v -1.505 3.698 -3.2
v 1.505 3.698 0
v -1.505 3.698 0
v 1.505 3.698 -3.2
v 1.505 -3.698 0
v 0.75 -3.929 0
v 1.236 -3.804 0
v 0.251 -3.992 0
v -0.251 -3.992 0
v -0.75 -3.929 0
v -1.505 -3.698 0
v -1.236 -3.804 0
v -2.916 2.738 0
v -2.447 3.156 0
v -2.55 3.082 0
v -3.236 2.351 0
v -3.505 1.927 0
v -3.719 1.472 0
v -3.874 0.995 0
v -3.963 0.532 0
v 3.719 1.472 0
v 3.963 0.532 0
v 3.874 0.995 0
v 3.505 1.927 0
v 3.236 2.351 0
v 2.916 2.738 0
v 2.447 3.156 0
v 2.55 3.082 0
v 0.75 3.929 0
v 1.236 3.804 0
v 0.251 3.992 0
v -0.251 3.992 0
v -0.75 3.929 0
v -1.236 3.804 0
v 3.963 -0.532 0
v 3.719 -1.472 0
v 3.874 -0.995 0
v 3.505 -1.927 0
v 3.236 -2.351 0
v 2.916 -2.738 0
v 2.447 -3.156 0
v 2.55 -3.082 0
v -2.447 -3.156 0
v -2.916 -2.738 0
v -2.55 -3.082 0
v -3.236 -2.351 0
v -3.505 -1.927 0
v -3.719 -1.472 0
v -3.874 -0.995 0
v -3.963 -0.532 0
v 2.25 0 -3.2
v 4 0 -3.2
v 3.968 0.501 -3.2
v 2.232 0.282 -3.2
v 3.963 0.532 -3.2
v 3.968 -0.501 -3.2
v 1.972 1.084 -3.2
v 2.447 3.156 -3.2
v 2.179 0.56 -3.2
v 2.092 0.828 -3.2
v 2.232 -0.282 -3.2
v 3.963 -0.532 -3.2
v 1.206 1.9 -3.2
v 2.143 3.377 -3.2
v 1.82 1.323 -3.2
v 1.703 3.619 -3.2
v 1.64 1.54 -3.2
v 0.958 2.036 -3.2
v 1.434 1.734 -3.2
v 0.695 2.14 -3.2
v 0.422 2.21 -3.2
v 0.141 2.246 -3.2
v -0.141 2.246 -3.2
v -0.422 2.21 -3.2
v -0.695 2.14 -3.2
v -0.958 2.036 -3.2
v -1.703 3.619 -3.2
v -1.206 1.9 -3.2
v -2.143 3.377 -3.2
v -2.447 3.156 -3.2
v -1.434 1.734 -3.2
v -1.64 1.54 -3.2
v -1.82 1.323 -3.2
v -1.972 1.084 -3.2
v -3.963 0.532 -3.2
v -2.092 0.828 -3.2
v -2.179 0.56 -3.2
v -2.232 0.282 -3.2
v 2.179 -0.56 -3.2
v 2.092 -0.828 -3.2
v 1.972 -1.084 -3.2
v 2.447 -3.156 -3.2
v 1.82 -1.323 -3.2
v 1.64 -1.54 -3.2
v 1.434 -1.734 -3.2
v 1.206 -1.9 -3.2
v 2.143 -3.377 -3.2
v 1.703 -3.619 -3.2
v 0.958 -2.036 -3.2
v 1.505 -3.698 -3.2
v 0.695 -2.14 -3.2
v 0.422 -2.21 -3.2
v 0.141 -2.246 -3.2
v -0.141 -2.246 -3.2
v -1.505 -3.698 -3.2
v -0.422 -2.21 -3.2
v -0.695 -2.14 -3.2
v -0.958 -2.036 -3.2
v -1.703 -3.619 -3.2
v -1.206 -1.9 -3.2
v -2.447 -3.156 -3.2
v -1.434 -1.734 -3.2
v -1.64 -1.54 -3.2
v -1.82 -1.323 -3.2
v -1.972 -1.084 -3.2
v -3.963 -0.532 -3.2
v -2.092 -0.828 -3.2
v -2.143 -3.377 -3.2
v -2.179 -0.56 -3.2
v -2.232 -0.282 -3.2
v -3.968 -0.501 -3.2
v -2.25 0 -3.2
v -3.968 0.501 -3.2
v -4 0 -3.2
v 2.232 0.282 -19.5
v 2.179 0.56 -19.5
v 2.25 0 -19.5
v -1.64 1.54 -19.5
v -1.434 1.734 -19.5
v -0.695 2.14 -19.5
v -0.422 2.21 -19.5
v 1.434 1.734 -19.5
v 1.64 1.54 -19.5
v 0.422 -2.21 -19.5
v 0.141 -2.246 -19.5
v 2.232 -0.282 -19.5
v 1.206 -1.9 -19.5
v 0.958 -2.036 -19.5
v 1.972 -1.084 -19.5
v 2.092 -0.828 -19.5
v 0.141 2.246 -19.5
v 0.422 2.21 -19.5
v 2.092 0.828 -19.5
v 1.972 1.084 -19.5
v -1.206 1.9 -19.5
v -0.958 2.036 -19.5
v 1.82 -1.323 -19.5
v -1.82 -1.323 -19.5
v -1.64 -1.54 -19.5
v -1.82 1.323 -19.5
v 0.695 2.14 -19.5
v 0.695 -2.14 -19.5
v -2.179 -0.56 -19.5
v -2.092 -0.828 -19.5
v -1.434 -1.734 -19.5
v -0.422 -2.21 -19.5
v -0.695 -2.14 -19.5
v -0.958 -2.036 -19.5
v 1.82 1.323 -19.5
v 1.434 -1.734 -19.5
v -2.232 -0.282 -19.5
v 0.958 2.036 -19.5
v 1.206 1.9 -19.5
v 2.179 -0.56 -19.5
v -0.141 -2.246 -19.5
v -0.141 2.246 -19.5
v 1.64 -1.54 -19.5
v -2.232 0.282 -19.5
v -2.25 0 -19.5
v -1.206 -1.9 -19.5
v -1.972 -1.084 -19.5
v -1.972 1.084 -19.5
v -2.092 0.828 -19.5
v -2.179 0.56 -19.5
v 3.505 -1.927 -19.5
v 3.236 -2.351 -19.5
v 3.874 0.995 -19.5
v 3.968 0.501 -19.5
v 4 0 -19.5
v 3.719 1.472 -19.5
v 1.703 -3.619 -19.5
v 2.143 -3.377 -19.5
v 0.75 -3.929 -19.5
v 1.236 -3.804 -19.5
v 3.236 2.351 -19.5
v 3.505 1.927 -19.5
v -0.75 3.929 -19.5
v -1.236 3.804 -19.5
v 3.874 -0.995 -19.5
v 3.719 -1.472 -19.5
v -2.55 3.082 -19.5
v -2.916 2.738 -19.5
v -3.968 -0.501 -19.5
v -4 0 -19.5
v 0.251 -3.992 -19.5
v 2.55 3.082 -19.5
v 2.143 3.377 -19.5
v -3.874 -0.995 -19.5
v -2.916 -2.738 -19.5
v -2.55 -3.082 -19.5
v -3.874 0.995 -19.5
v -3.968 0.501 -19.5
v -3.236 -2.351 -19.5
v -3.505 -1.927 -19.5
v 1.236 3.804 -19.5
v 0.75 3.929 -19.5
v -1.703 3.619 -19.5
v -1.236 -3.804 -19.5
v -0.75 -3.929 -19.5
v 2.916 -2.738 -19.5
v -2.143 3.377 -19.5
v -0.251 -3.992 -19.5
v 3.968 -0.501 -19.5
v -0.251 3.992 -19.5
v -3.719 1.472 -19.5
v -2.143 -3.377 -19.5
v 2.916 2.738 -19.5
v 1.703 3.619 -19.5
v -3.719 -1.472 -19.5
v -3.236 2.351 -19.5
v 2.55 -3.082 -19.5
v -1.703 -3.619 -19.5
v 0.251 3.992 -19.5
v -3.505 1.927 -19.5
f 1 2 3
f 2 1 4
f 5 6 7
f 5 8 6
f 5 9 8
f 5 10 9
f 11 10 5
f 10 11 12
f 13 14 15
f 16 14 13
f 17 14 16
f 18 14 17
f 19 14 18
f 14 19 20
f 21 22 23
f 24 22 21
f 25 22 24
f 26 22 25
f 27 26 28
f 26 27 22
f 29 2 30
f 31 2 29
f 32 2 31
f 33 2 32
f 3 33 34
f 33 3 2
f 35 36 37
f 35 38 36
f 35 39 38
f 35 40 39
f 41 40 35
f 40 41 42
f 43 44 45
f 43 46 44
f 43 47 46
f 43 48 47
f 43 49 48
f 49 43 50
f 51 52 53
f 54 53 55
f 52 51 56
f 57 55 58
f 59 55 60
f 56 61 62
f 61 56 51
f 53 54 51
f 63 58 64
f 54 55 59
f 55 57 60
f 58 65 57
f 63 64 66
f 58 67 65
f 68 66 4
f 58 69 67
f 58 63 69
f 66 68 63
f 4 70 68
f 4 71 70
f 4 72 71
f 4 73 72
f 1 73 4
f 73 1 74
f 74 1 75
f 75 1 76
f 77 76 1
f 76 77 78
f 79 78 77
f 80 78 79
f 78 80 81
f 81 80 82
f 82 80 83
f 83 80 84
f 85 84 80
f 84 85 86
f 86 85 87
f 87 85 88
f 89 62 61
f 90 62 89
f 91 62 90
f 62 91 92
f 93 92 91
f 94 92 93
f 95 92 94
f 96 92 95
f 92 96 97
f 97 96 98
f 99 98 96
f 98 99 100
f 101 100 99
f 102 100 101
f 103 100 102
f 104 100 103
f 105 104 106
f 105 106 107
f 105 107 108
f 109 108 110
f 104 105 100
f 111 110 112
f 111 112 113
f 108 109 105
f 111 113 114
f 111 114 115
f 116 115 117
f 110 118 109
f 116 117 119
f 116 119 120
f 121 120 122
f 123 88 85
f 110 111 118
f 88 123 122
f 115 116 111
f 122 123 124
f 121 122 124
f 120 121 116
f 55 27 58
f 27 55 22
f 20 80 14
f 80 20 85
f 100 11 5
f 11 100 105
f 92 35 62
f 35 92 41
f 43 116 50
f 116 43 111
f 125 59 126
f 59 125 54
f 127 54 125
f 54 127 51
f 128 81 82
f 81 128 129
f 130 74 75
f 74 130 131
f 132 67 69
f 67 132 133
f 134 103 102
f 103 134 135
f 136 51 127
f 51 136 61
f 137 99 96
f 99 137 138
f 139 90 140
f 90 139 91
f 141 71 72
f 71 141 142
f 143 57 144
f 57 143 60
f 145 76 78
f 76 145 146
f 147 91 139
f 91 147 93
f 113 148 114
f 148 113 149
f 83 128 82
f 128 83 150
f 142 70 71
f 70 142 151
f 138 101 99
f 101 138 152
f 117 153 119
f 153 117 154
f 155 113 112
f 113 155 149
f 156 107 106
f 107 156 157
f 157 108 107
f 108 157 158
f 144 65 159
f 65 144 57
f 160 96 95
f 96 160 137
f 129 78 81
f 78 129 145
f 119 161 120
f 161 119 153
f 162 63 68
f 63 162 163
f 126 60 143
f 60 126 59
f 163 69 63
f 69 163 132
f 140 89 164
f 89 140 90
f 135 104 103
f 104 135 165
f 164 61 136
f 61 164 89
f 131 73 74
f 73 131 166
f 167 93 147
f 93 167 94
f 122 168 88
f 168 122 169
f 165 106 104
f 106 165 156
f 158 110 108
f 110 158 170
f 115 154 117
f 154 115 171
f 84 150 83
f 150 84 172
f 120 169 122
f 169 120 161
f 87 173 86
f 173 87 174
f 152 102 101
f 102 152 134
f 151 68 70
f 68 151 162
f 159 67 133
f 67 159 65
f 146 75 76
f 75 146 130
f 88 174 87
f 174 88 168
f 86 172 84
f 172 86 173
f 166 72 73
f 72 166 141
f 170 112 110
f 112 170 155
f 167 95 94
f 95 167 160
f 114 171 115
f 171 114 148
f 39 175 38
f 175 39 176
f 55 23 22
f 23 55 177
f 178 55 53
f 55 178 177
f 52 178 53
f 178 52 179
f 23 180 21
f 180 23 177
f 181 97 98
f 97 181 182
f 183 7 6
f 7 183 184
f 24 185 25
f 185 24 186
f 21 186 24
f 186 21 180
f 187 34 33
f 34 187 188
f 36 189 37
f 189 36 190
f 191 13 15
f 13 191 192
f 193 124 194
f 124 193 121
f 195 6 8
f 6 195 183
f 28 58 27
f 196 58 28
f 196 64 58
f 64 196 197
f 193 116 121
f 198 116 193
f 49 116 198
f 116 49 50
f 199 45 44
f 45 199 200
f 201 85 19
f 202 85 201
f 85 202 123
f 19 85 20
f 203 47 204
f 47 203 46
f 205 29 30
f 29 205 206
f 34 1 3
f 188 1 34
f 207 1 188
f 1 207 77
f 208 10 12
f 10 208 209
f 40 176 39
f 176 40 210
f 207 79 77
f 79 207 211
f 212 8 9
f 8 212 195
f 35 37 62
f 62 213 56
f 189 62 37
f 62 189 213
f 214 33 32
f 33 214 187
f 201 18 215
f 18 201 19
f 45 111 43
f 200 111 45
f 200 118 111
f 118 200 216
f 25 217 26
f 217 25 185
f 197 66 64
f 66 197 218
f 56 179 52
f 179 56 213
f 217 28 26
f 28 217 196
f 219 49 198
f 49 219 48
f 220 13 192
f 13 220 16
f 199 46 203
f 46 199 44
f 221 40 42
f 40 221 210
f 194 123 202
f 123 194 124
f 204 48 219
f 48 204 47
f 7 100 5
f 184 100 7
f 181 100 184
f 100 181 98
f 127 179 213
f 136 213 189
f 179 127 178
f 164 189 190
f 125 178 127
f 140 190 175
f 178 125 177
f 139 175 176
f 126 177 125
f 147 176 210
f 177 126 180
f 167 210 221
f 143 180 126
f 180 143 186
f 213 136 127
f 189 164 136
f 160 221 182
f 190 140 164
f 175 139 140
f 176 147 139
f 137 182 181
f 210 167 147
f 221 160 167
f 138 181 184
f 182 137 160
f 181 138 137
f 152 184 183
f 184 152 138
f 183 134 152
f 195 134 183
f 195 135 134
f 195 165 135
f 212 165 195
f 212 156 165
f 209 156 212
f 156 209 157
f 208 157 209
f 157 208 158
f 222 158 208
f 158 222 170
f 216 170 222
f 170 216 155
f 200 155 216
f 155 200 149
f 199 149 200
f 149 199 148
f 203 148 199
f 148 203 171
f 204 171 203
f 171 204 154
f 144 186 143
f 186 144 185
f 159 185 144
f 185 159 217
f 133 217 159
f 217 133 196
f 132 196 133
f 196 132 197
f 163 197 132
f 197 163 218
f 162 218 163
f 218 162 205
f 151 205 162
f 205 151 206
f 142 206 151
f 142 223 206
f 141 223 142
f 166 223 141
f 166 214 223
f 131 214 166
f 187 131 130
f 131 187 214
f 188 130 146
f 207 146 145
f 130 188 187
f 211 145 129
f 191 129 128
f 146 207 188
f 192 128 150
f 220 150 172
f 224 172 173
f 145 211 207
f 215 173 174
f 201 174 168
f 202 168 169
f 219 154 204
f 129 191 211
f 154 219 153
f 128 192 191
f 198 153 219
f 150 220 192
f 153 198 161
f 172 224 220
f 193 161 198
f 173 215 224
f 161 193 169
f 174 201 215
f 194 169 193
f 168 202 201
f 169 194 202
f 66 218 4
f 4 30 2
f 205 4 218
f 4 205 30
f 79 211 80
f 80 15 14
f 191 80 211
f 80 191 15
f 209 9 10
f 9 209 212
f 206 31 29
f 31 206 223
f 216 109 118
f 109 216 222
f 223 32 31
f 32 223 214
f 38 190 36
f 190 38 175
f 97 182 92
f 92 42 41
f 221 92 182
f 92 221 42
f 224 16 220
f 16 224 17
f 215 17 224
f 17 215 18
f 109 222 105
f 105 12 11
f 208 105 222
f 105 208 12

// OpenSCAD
$fn = 50;

difference() {
	union() {
		translate(v = [0, 0, -19.5]) {
			cylinder(h = 19.5, r = 4.0);
		}
	}
	union() {
		translate(v = [0, 0, 0]) {
			rotate(a = [0, 0, 0]) {
				difference() {
					union() {
						translate(v = [0, 0, -3.2]) {
							linear_extrude(height = 3.2) {
								polygon(points = [[4.2698, 0.0], [2.1349000000000005, 3.697755269078796], [-2.134899999999999, 3.6977552690787965], [-4.2698, 5.228996902999369e-16], [-2.134900000000002, -3.6977552690787956], [2.1348999999999974, -3.697755269078798]]);
							}
						}
					}
					union();
				}
			}
		}
		#translate(v = [0, 0, -100.0]) {
			cylinder(h = 200, r = 2.25);
		}
	}
}
